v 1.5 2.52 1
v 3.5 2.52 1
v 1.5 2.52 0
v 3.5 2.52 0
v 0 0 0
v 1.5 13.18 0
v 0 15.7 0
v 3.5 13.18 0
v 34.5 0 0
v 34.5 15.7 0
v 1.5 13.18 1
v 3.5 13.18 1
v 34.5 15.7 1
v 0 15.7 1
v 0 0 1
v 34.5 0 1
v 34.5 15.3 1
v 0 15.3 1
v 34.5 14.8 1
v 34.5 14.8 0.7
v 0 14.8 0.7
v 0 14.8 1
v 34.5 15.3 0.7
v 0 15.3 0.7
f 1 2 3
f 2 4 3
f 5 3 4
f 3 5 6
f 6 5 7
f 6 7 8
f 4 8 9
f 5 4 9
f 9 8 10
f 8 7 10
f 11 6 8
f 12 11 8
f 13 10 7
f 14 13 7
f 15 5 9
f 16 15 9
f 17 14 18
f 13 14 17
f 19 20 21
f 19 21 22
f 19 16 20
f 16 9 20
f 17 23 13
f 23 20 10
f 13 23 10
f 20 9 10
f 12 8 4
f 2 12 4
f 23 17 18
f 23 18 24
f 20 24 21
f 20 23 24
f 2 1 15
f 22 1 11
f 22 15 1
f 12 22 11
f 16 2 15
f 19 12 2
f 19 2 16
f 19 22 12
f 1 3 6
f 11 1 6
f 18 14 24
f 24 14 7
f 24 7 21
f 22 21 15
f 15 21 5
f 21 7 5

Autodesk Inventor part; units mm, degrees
ref_plane "YZ Plane" through (0, 0, 0) normal (1, 0, 0) x (0, 1, 0)
ref_plane "XZ Plane" through (0, 0, 0) normal (0, 1, 0) x (-1, 0, 0)
ref_plane "XY Plane" through (0, 0, 0) normal (0, 0, 1) x (1, 0, 0)
sketch "Sketch1" plane through (0, 0, 0) normal (0, 0, 1) x (1, 0, 0)
  line L0 (0, 0) -> (34.5, 0)
  line L1 (34.5, 0) -> (34.5, 15.7)
  line L2 (34.5, 15.7) -> (0, 15.7)
  line L3 (0, 15.7) -> (0, 0)
  dimension "d0" = 34.5
  dimension "d1" = 15.7
extrude "Extrusion1" add sketch "Sketch1" along normal blind 1
sketch "Sketch3" plane through (34.5, 0, 0) normal (1, 0, 0) x (0, 0, -1)
  line L0 (-1, 0) -> (-1, 15.7) projected
  line L1 (-1, 15.3) -> (-0.7, 15.3)
  line L2 (-0.7, 15.3) -> (-0.7, 14.8)
  line L3 (-0.7, 14.8) -> (-1, 14.8)
  line L4 (-1, 14.8) -> (-1, 15.3)
  line L5 (0, 15.7) -> (-1, 15.7) projected
  dimension "d8" = 0.3
  dimension "d9" = 0.5
  dimension "d12" = 0.4
extrude "Extrusion3" cut sketch "Sketch3" against normal blind 40
sketch "Sketch5" plane through (0, 0, 0) normal (0, 0, -1) x (-1, 0, 0)
  line L0 (-1.5, 13.18) -> (-3.5, 13.18)
  line L1 (-3.5, 13.18) -> (-3.5, 2.5199)
  line L2 (-3.5, 2.5199) -> (-1.5, 2.5199)
  line L3 (-1.5, 2.5199) -> (-1.5, 13.18)
  line L4 (0, 15.7) -> (0, 0) projected
  line L5 (-34.5, 15.7) -> (0, 15.7) projected
  dimension "d18" = 2
  dimension "d19" = 10.6601
  dimension "d20" = 2.52
  dimension "d21" = 1.5
extrude "Extrusion5" cut sketch "Sketch5" against normal blind 2
properties part number "Zijkant 2"
